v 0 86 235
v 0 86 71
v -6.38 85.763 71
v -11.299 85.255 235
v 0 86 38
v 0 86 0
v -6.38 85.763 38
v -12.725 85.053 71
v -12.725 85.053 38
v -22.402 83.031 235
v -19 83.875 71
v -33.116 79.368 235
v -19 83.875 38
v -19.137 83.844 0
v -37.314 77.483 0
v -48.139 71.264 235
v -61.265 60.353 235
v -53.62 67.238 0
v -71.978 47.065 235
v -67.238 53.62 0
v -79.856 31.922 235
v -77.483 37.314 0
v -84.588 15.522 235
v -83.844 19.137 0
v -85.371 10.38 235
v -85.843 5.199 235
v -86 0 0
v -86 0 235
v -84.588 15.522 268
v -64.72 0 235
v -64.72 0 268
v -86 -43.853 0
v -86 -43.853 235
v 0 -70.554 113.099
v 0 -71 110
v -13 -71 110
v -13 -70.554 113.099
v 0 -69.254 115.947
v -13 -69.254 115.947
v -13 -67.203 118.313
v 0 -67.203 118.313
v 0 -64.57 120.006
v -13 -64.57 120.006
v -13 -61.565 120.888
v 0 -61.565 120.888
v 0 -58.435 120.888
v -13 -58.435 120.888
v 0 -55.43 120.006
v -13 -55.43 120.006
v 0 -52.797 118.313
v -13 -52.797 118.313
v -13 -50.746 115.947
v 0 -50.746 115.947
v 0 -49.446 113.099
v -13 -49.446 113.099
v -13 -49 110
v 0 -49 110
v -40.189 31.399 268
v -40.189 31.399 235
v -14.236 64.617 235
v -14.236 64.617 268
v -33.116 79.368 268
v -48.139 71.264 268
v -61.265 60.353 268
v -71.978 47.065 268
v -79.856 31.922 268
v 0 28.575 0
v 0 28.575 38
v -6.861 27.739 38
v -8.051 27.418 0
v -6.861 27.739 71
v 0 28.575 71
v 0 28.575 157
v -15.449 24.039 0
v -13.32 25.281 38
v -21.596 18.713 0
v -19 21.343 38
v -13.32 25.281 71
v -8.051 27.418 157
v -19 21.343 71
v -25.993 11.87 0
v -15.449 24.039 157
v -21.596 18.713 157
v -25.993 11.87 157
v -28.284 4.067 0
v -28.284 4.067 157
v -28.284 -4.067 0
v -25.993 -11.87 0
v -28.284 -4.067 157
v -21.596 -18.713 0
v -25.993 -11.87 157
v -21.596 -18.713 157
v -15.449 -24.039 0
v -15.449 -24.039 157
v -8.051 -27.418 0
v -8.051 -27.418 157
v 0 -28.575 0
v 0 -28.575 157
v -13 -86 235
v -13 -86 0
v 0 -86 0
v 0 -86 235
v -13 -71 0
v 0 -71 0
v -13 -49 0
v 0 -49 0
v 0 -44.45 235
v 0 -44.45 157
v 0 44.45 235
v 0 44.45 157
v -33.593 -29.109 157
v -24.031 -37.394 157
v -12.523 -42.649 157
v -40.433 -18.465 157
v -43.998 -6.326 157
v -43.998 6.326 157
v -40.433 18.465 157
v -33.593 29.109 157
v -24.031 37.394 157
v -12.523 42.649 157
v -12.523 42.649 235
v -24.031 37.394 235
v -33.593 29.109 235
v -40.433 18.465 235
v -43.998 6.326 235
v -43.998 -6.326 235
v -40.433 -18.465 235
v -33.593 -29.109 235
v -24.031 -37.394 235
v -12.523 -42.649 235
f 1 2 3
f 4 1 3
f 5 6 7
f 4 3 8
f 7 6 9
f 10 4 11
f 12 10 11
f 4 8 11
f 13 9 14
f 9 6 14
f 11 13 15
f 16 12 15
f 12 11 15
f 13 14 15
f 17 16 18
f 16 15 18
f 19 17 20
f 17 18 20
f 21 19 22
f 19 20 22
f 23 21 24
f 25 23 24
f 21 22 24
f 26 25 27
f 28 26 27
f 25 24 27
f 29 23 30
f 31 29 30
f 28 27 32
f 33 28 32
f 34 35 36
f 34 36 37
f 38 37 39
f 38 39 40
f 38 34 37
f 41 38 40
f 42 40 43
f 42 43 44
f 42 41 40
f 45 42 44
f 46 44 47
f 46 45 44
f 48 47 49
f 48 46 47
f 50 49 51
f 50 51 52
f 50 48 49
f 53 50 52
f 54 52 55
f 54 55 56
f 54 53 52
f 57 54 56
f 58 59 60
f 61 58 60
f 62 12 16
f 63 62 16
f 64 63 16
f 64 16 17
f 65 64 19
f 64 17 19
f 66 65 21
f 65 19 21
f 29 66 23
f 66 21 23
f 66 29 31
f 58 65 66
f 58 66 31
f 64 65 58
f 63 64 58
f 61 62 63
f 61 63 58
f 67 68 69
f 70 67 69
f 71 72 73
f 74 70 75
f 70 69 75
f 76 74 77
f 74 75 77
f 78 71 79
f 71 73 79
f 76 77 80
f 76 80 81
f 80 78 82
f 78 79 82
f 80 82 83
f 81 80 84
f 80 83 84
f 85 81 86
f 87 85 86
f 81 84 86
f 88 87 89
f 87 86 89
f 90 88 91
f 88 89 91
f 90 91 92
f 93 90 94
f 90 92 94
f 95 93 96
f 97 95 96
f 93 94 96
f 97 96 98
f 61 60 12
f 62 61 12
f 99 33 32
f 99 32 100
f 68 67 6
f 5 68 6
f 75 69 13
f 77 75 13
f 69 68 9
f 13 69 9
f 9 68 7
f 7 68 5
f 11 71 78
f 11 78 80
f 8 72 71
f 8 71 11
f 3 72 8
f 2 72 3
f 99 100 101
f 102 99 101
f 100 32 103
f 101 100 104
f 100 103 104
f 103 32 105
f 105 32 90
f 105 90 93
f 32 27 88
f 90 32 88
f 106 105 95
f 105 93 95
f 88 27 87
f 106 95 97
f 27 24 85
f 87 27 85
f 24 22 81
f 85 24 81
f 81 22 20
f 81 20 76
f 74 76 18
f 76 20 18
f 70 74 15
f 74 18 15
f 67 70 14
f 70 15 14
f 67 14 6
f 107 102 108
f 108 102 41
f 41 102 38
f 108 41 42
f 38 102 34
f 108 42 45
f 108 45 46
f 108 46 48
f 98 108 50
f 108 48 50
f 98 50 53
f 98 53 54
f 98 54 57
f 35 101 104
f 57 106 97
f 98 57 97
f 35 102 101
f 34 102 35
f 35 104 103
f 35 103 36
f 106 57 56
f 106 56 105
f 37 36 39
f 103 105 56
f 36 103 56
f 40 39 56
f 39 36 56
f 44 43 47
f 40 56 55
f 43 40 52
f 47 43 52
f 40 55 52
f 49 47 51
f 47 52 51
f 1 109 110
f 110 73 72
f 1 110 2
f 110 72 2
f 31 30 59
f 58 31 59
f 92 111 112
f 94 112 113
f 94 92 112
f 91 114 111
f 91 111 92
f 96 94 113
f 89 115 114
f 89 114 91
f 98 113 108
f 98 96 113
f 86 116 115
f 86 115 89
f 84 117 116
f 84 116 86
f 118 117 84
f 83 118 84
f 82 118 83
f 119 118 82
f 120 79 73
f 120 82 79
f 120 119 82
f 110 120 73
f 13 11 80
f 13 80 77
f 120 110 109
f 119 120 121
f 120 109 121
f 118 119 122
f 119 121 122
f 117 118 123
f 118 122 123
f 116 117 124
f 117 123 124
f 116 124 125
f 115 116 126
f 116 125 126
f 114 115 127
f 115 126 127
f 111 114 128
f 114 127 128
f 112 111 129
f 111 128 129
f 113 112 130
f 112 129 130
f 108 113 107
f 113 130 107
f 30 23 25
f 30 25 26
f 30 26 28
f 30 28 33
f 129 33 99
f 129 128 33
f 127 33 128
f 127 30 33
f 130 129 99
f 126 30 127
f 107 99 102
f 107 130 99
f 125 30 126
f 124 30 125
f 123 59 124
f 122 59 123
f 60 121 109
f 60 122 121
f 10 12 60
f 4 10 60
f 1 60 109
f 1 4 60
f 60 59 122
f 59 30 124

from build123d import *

# Parameters (mm, degrees)
BOSS_EXTRU_1_DEPTH      = 235
ESQUISSE2_R             = 44.45
ENL_V_MAT_EXTRU_1_DEPTH = 78
ESQUISSE3_R             = 28.575
ENL_V_MAT_EXTRU_2_DEPTH = 199.597583067
BOSS_EXTRU_4_DEPTH      = 33
ESQUISSE8_W             = 33
ESQUISSE8_H             = 90
ENL_V_MAT_EXTRU_4_DEPTH = 19
ENL_V_MAT_EXTRU_5_DEPTH = 13


with BuildPart() as part:
    # Esquisse1 → Boss.-Extru.1 (new body)
    with BuildSketch(Plane.XY):
        with BuildLine():
            Line((0, -86), (0, 86))
            ThreePointArc((0, 86), (-60.811183182, 60.811183182), (-86, 0))
            Line((-86, 0), (-86, -43.853430349))
            Line((-86, -43.853430349), (-13, -86))
            Line((-13, -86), (0, -86))
        make_face()
    extrude(amount=BOSS_EXTRU_1_DEPTH)

    # Esquisse2 → Enlèv. mat.-Extru.1 (cut)
    with BuildSketch(Plane.XY.offset(235)):
        Circle(ESQUISSE2_R)
    extrude(amount=-ENL_V_MAT_EXTRU_1_DEPTH, mode=Mode.SUBTRACT)

    # Esquisse3 → Enlèv. mat.-Extru.2 (cut, through all)
    with BuildSketch(Plane.XY.offset(157)):
        Circle(ESQUISSE3_R)
    extrude(amount=-ENL_V_MAT_EXTRU_2_DEPTH, mode=Mode.SUBTRACT)

    # Esquisse7 → Boss.-Extru.4 (add)
    with BuildSketch(Plane.XY.offset(235)):
        with BuildLine():
            Line((-64.719928969, 0), (-40.188548434, 31.398735242))
            Line((-40.188548434, 31.398735242), (-14.235687992, 64.616881796))
            Line((-14.235687992, 64.616881796), (-33.116437077, 79.368139674))
            ThreePointArc((-33.116437077, 79.368139674), (-66.952455175, 53.975631039), (-84.587575845, 15.522306937))
            Line((-84.587575845, 15.522306937), (-64.719928969, 0))
        make_face()
    extrude(amount=BOSS_EXTRU_4_DEPTH)

    # Esquisse8 → Enlèv. mat.-Extru.4 (cut)
    with BuildSketch(Plane(origin=(0, 0, 0), x_dir=(0, 0, -1), z_dir=(1, 0, 0))):
        with Locations((-54.5, 49.335999727)):
            Rectangle(ESQUISSE8_W, ESQUISSE8_H)
    extrude(amount=-ENL_V_MAT_EXTRU_4_DEPTH, mode=Mode.SUBTRACT)

    # Esquisse9 → Enlèv. mat.-Extru.5 (cut)
    with BuildSketch(Plane(origin=(0, 0, 0), x_dir=(0, 0, -1), z_dir=(1, 0, 0))):
        with BuildLine():
            Line((-110, -49), (0, -49))
            Line((0, -49), (0, -71))
            Line((0, -71), (-110, -71))
            ThreePointArc((-110, -71), (-121, -60), (-110, -49))
        make_face()
    extrude(amount=-ENL_V_MAT_EXTRU_5_DEPTH, mode=Mode.SUBTRACT)


solid = part.part
